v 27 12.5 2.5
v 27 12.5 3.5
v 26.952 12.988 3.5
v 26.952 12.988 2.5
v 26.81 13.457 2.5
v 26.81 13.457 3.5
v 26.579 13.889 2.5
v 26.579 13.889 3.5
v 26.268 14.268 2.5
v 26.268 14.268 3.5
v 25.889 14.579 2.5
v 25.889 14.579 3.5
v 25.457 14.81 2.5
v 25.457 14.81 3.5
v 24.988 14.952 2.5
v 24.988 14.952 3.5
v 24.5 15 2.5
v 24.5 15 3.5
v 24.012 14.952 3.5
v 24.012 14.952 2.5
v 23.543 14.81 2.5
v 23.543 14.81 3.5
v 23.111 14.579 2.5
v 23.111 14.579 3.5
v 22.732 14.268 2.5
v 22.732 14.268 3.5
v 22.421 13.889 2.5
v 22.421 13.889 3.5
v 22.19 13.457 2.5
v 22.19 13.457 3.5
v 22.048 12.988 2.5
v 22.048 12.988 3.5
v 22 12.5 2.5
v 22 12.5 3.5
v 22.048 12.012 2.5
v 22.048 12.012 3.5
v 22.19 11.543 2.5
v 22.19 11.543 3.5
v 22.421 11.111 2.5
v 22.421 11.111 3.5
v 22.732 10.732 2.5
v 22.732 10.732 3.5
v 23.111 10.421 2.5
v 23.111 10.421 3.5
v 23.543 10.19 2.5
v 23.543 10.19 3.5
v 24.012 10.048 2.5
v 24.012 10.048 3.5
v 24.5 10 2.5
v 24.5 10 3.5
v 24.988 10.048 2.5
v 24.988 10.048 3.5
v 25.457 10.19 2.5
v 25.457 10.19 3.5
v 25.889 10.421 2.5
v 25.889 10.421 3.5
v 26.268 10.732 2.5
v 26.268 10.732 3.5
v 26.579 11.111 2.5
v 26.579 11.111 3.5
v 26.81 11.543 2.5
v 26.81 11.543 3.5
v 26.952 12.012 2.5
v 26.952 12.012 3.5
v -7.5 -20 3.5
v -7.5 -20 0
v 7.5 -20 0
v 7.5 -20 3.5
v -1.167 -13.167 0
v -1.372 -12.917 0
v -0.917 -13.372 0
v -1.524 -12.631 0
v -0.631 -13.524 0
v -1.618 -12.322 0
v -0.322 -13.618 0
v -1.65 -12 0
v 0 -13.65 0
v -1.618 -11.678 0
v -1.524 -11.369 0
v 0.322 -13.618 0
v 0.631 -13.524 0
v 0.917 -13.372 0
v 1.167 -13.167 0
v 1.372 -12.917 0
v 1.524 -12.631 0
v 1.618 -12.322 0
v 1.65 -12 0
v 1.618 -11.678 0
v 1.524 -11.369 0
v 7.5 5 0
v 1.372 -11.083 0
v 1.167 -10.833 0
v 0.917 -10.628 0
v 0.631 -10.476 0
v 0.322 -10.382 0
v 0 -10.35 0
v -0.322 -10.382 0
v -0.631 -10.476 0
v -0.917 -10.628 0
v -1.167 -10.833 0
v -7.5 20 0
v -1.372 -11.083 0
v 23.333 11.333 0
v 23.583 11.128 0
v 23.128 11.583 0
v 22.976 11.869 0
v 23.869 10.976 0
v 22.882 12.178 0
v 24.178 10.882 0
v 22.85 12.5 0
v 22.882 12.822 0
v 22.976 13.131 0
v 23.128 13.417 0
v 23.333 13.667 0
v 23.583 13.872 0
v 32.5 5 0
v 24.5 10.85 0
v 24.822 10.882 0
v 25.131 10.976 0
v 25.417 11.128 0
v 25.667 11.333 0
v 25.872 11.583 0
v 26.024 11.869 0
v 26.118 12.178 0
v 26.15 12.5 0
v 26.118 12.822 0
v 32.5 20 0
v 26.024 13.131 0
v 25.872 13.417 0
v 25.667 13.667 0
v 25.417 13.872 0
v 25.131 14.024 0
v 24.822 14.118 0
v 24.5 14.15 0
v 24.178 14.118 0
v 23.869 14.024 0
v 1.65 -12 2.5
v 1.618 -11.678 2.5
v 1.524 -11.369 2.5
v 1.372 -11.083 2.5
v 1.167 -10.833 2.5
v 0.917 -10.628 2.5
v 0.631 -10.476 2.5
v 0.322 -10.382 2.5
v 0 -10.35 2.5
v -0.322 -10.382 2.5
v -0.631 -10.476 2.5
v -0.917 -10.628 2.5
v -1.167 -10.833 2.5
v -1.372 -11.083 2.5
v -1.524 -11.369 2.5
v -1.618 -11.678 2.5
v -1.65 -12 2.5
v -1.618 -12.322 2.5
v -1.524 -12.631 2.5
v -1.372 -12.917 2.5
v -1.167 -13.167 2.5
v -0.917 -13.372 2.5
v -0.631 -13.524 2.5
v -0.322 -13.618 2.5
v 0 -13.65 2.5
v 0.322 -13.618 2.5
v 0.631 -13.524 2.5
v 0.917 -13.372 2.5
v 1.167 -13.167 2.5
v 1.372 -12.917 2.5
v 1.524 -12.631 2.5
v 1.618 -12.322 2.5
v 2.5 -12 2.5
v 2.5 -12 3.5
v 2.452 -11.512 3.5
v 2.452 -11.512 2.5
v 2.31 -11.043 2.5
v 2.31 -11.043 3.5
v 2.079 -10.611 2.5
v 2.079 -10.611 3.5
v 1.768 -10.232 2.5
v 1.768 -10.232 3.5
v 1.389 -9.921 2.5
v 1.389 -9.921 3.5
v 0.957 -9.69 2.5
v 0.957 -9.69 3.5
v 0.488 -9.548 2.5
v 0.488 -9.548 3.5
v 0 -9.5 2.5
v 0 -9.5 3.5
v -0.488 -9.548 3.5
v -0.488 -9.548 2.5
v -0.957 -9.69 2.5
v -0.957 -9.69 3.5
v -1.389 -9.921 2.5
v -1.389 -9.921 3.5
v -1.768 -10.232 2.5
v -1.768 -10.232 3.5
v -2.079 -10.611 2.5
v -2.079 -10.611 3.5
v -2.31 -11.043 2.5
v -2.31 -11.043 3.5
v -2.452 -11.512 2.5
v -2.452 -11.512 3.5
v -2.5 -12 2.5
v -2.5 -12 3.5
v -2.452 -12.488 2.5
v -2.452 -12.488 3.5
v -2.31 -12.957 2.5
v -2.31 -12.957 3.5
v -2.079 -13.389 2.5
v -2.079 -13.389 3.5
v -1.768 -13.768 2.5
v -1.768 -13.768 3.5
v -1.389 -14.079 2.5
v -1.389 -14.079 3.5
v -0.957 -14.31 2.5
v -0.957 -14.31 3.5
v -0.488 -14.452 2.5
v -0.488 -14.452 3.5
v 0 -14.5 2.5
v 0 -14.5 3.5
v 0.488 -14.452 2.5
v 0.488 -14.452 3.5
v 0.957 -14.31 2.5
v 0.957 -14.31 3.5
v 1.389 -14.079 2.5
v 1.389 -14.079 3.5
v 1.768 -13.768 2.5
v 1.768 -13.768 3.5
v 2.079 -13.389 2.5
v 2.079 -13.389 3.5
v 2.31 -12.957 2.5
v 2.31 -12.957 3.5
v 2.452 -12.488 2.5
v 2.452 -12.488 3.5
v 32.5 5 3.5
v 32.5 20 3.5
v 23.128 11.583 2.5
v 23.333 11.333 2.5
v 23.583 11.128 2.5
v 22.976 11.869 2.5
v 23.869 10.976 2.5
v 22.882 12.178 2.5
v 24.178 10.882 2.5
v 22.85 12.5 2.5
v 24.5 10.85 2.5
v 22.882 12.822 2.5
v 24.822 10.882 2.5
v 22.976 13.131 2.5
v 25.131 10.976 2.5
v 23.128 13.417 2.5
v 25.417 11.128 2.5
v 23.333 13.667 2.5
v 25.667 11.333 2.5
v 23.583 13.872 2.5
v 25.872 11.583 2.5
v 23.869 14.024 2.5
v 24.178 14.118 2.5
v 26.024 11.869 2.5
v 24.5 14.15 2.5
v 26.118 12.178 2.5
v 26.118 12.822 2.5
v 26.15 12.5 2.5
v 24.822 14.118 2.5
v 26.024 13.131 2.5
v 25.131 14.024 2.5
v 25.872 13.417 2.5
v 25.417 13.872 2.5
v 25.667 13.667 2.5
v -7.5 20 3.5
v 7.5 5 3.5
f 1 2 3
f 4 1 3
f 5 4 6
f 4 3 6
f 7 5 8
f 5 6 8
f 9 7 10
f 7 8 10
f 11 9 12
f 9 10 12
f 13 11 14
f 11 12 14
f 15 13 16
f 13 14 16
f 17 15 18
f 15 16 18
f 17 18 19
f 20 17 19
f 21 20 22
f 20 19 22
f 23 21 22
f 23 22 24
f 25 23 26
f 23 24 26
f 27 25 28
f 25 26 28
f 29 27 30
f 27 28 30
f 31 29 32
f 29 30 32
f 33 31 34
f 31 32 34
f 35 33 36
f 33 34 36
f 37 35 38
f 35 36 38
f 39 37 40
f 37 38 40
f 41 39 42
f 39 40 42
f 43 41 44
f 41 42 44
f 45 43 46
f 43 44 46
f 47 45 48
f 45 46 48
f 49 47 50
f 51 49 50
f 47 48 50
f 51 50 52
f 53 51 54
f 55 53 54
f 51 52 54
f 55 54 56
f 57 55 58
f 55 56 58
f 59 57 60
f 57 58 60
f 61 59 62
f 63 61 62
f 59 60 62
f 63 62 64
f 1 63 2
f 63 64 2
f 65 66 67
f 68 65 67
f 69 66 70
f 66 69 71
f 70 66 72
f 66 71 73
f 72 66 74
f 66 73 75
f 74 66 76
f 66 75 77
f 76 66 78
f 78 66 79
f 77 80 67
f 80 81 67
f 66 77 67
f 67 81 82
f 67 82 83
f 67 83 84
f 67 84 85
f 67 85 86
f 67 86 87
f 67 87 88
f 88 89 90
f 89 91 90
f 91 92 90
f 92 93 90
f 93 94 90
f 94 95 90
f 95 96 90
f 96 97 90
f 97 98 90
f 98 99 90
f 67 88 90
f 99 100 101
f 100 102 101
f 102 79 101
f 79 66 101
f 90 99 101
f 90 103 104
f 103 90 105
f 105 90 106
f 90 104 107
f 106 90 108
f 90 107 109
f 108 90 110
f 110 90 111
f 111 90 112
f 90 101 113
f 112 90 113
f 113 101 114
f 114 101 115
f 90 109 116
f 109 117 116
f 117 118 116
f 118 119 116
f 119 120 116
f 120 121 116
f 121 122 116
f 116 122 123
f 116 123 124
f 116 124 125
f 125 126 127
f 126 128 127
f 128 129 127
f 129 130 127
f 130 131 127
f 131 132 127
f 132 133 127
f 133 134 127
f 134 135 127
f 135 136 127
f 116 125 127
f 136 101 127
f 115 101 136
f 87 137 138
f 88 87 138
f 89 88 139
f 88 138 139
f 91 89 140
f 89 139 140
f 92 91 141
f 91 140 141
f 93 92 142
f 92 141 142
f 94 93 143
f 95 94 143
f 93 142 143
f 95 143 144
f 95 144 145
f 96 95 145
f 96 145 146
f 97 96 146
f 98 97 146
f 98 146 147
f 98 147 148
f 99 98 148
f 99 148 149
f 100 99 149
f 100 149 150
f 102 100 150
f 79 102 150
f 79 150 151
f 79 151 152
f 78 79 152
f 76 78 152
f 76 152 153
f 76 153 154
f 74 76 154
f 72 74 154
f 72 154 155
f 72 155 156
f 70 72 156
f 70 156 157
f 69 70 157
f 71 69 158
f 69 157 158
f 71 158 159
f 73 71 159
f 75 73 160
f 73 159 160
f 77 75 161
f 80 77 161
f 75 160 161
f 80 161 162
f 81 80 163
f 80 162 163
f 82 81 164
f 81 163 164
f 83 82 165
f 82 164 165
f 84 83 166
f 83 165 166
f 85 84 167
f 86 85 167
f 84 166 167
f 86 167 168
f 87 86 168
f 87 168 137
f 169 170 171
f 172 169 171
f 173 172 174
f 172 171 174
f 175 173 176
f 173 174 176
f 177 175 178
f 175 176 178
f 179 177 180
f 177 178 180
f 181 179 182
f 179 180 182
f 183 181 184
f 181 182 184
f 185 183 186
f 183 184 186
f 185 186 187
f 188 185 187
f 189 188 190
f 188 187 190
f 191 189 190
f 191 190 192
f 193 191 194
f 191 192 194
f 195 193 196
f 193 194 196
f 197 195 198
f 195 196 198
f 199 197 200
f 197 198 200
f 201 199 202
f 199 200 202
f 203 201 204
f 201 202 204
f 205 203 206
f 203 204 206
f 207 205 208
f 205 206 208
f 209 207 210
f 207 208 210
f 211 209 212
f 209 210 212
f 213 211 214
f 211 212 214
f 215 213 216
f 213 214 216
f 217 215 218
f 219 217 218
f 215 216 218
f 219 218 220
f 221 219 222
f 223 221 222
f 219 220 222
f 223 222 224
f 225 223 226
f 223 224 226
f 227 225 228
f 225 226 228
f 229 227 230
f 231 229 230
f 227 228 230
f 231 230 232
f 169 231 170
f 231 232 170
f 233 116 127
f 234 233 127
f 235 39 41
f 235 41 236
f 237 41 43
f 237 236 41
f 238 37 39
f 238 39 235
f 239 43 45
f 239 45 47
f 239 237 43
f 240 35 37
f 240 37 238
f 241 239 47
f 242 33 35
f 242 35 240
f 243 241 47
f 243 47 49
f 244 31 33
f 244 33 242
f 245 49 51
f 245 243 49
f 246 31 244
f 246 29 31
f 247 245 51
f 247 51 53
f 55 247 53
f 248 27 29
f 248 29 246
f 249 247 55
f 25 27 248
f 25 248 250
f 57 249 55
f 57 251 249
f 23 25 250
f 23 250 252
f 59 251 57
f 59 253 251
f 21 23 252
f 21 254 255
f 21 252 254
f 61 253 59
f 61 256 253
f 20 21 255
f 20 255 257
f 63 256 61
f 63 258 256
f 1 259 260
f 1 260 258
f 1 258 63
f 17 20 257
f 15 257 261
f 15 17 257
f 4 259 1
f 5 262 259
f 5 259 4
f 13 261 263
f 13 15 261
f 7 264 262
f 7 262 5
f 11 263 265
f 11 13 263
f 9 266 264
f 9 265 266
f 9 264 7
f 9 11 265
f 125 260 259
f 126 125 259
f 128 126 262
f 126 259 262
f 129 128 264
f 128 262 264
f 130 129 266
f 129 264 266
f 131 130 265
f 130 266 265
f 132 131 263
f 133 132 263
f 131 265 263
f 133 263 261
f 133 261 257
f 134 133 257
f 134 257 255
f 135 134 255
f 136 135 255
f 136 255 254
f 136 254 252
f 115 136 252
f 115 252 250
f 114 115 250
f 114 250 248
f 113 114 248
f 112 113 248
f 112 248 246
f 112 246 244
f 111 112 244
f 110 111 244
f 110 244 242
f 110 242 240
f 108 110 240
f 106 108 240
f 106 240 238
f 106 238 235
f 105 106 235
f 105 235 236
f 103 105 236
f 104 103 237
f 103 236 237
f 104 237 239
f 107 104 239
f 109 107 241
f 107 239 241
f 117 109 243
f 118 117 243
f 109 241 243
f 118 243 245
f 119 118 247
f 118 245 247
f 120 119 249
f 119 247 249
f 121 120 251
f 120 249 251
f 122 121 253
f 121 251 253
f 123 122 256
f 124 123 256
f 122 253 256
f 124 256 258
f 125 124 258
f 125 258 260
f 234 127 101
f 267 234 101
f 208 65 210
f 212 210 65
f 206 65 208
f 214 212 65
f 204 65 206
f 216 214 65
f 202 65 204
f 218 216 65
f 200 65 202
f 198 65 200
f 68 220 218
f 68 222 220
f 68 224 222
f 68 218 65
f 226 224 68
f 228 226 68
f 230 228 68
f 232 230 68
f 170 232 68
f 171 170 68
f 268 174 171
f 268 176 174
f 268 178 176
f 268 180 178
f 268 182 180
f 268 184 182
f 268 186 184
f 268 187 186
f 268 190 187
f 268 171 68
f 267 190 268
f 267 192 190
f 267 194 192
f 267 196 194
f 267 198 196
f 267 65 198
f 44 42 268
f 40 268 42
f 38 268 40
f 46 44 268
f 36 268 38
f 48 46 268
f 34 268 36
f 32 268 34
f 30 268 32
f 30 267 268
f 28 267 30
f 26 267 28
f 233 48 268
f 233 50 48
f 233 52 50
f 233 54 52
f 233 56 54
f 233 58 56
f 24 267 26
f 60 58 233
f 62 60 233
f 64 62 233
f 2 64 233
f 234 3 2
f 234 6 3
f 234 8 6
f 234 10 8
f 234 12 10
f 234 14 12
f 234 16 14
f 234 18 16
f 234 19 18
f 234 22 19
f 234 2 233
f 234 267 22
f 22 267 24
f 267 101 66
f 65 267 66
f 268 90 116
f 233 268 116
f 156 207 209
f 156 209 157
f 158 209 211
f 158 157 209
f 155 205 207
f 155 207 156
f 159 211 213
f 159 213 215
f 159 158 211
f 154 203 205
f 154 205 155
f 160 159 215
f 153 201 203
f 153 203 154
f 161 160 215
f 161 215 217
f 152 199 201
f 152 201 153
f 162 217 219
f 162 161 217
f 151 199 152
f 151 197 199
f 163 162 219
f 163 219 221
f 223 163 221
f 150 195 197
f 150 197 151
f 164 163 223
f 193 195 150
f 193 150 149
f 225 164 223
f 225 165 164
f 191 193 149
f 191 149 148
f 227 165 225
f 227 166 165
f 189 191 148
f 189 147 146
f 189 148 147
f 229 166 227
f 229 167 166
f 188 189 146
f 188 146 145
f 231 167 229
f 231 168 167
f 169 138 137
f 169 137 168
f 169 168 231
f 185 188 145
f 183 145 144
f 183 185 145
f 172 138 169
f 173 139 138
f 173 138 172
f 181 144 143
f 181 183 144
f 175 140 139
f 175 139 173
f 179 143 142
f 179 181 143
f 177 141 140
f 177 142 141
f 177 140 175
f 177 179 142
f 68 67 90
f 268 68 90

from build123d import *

# Parameters (mm, degrees)
F0_W     = 25
F0_H     = 15
F1_DEPTH = 3.5
F2_R     = 1.65
F3_DEPTH = 3.5
F2_R_2   = 2.5
F4_DEPTH = 1


with BuildPart() as f1:
    # F0 (on Top) → F1 (new body)
    with BuildSketch(Plane.XY):
        Polygon((7.5, 20), (-7.5, 20), (-7.5, -20), (7.5, -20), (7.5, 5), align=None)
        with Locations((20, 12.5)):
            Rectangle(F0_W, F0_H)
    extrude(amount=F1_DEPTH)

    # F2 (on face) → F3 (cut, through all)
    with BuildSketch(Plane.XY.offset(3.5)):
        with Locations((0, -12)):
            Circle(F2_R)
        with Locations((24.5, 12.5)):
            Circle(F2_R)
    extrude(amount=-F3_DEPTH, mode=Mode.SUBTRACT)

    # F2 (on face) → F4 (cut)
    with BuildSketch(Plane.XY.offset(3.5)):
        with Locations((0, -12)):
            Circle(F2_R_2)
        with Locations((0, -12)):
            Circle(F2_R, mode=Mode.SUBTRACT)
        with Locations((24.5, 12.5)):
            Circle(F2_R_2)
        with Locations((24.5, 12.5)):
            Circle(F2_R, mode=Mode.SUBTRACT)
    extrude(amount=-F4_DEPTH, mode=Mode.SUBTRACT)


solid = f1.part
